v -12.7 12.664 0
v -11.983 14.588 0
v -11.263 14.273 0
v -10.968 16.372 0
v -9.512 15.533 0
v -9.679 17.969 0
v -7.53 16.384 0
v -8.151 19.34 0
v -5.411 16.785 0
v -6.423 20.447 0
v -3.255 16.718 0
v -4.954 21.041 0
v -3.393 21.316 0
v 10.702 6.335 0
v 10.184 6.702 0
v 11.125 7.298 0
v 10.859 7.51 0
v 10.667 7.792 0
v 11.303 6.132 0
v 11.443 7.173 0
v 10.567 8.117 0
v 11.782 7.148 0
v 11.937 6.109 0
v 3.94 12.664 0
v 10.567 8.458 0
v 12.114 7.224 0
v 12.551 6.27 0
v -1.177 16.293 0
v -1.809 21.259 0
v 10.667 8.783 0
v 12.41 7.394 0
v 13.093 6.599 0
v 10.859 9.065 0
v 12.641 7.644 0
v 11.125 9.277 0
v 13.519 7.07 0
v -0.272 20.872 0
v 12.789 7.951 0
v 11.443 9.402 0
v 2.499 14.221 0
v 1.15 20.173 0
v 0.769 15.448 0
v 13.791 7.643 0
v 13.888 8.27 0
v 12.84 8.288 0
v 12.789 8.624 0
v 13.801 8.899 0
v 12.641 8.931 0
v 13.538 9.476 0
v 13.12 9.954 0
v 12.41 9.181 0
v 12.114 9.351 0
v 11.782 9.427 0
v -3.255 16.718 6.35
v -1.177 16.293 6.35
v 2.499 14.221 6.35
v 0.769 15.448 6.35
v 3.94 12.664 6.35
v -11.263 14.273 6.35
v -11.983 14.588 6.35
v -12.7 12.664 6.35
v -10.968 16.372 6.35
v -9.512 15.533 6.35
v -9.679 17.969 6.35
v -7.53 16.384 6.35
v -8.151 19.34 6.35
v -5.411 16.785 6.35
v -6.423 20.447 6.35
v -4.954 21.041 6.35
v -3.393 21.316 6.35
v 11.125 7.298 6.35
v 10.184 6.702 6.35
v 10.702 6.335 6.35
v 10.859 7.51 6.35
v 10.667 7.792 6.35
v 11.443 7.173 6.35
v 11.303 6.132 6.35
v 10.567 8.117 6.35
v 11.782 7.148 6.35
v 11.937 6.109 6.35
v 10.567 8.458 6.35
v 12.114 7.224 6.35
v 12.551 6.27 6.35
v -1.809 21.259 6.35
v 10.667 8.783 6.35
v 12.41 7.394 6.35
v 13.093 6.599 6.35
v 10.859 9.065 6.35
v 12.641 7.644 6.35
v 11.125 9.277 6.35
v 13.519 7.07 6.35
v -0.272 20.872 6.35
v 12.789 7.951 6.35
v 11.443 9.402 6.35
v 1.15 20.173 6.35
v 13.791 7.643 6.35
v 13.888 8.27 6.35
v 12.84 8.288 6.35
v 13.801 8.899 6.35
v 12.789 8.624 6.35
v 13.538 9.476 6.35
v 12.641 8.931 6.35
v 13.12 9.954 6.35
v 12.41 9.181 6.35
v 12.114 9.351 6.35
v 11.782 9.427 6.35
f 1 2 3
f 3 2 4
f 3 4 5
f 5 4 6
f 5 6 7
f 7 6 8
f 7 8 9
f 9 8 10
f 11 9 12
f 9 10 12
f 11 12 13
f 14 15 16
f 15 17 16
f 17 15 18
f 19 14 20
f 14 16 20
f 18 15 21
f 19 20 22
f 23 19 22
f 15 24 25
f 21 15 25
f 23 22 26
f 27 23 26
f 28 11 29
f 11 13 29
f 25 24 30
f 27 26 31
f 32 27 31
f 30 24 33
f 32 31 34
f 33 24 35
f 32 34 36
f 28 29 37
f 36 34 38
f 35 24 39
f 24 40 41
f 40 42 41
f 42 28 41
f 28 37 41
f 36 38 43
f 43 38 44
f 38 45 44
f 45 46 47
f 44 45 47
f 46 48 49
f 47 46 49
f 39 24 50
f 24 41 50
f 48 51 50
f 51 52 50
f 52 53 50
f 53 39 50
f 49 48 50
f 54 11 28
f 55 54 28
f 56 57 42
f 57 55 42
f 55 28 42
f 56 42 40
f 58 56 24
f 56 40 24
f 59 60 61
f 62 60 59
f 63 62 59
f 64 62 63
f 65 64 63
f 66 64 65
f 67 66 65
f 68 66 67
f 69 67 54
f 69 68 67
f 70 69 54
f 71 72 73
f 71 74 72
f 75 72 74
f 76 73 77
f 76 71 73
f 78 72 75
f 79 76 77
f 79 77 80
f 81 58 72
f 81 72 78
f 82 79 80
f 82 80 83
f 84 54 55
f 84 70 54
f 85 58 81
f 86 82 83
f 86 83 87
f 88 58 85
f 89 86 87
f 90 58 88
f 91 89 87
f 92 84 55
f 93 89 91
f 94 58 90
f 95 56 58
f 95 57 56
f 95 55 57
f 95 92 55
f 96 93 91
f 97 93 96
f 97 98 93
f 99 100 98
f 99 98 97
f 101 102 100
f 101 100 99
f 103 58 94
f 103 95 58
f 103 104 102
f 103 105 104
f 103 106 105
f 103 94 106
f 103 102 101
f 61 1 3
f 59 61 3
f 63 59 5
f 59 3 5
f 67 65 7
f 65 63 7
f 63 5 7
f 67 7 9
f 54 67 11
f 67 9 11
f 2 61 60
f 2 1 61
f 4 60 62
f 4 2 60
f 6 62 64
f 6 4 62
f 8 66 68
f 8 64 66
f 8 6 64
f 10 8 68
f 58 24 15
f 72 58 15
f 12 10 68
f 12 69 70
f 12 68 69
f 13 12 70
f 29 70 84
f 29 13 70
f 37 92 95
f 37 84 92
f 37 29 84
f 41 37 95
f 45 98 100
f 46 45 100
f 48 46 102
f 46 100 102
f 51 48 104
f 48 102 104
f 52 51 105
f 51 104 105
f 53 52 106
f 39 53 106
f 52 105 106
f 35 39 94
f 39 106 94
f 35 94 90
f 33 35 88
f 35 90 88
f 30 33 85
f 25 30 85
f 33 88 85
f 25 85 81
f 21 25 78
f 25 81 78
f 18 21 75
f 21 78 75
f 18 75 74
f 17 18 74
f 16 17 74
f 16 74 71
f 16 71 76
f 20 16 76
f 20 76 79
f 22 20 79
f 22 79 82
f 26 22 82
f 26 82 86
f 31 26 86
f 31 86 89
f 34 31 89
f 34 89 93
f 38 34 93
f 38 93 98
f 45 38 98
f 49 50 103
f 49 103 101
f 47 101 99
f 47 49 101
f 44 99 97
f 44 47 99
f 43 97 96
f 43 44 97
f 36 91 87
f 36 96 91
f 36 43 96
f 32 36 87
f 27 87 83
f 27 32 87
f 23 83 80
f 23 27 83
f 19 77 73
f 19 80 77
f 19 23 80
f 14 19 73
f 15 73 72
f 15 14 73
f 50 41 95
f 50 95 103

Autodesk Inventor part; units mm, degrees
ref_plane "YZ Plane" through (0, 0, 0) normal (1, 0, 0) x (0, 1, 0)
ref_plane "XZ Plane" through (0, 0, 0) normal (0, 1, 0) x (-1, 0, 0)
ref_plane "XY Plane" through (0, 0, 0) normal (0, 0, 1) x (1, 0, 0)
sketch "Sketch1" plane through (0, 0, 0) normal (0, 0, 1) x (1, 0, 0)
  arc A0 (-3.2553, 16.7185) -> (-12.7, 12.6645) centre (-4.6373, 6.9094) ccw
  arc A1 (-6.4227, 20.4471) -> (-12.7, 12.6645) centre (-0.4241, 9.1858) ccw
  arc A2 (1.1505, 20.1734) -> (-6.4227, 20.4471) centre (-2.8721, 13.7815) ccw
  arc A3 (3.9398, 12.6645) -> (-3.2553, 16.7185) centre (-4.2623, 6.5193) ccw
  line L0 (1.1505, 20.1734) -> (13.1197, 9.9539)
  line L1 (3.9398, 12.6645) -> (10.1839, 6.7025)
  arc A4 (10.1837, 6.7027) -> (13.1197, 9.9539) centre (11.6969, 8.2875) ccw
  point P0 (0, 0)
  point P1 (-12.7, 0)
  dimension "d0" = 9.906
extrude "Extrusion1" add sketch "Sketch1" along normal blind 6.35
sketch "Sketch2" plane through (0, 0, 6.35) normal (0, 0, 1) x (1, 0, 0)
  arc A0 (10.1837, 6.7027) -> (13.1197, 9.9539) centre (11.6969, 8.2875) ccw projected
  circle A1 centre (11.6969, 8.2875) radius 1.143
  point P0 (0, 0)
  dimension "d3" = 2.286
extrude "Extrusion2" cut sketch "Sketch2" against normal blind 25.4
sketch "Sketch3" plane through (0, 0, 6.35) normal (0, 0, 1) x (1, 0, 0)
  arc A0 (16.5583, -0.6886) -> (21.2023, 4.6943) centre (18.8803, 2.0028) ccw
  line L0 (21.2023, 4.6943) -> (1.9212, 21.3289)
  line L1 (16.5583, -0.6886) -> (1.9487, 11.9157)
  arc A1 (1.9487, 11.9157) -> (-13.3635, 11.0028) centre (-5.238, 3.5857) ccw
  arc A2 (1.9212, 21.3289) -> (-13.3635, 11.0028) centre (-3.1996, 12.4333) ccw
  point P0 (0, 0)
properties part number "other ratchet piece"
